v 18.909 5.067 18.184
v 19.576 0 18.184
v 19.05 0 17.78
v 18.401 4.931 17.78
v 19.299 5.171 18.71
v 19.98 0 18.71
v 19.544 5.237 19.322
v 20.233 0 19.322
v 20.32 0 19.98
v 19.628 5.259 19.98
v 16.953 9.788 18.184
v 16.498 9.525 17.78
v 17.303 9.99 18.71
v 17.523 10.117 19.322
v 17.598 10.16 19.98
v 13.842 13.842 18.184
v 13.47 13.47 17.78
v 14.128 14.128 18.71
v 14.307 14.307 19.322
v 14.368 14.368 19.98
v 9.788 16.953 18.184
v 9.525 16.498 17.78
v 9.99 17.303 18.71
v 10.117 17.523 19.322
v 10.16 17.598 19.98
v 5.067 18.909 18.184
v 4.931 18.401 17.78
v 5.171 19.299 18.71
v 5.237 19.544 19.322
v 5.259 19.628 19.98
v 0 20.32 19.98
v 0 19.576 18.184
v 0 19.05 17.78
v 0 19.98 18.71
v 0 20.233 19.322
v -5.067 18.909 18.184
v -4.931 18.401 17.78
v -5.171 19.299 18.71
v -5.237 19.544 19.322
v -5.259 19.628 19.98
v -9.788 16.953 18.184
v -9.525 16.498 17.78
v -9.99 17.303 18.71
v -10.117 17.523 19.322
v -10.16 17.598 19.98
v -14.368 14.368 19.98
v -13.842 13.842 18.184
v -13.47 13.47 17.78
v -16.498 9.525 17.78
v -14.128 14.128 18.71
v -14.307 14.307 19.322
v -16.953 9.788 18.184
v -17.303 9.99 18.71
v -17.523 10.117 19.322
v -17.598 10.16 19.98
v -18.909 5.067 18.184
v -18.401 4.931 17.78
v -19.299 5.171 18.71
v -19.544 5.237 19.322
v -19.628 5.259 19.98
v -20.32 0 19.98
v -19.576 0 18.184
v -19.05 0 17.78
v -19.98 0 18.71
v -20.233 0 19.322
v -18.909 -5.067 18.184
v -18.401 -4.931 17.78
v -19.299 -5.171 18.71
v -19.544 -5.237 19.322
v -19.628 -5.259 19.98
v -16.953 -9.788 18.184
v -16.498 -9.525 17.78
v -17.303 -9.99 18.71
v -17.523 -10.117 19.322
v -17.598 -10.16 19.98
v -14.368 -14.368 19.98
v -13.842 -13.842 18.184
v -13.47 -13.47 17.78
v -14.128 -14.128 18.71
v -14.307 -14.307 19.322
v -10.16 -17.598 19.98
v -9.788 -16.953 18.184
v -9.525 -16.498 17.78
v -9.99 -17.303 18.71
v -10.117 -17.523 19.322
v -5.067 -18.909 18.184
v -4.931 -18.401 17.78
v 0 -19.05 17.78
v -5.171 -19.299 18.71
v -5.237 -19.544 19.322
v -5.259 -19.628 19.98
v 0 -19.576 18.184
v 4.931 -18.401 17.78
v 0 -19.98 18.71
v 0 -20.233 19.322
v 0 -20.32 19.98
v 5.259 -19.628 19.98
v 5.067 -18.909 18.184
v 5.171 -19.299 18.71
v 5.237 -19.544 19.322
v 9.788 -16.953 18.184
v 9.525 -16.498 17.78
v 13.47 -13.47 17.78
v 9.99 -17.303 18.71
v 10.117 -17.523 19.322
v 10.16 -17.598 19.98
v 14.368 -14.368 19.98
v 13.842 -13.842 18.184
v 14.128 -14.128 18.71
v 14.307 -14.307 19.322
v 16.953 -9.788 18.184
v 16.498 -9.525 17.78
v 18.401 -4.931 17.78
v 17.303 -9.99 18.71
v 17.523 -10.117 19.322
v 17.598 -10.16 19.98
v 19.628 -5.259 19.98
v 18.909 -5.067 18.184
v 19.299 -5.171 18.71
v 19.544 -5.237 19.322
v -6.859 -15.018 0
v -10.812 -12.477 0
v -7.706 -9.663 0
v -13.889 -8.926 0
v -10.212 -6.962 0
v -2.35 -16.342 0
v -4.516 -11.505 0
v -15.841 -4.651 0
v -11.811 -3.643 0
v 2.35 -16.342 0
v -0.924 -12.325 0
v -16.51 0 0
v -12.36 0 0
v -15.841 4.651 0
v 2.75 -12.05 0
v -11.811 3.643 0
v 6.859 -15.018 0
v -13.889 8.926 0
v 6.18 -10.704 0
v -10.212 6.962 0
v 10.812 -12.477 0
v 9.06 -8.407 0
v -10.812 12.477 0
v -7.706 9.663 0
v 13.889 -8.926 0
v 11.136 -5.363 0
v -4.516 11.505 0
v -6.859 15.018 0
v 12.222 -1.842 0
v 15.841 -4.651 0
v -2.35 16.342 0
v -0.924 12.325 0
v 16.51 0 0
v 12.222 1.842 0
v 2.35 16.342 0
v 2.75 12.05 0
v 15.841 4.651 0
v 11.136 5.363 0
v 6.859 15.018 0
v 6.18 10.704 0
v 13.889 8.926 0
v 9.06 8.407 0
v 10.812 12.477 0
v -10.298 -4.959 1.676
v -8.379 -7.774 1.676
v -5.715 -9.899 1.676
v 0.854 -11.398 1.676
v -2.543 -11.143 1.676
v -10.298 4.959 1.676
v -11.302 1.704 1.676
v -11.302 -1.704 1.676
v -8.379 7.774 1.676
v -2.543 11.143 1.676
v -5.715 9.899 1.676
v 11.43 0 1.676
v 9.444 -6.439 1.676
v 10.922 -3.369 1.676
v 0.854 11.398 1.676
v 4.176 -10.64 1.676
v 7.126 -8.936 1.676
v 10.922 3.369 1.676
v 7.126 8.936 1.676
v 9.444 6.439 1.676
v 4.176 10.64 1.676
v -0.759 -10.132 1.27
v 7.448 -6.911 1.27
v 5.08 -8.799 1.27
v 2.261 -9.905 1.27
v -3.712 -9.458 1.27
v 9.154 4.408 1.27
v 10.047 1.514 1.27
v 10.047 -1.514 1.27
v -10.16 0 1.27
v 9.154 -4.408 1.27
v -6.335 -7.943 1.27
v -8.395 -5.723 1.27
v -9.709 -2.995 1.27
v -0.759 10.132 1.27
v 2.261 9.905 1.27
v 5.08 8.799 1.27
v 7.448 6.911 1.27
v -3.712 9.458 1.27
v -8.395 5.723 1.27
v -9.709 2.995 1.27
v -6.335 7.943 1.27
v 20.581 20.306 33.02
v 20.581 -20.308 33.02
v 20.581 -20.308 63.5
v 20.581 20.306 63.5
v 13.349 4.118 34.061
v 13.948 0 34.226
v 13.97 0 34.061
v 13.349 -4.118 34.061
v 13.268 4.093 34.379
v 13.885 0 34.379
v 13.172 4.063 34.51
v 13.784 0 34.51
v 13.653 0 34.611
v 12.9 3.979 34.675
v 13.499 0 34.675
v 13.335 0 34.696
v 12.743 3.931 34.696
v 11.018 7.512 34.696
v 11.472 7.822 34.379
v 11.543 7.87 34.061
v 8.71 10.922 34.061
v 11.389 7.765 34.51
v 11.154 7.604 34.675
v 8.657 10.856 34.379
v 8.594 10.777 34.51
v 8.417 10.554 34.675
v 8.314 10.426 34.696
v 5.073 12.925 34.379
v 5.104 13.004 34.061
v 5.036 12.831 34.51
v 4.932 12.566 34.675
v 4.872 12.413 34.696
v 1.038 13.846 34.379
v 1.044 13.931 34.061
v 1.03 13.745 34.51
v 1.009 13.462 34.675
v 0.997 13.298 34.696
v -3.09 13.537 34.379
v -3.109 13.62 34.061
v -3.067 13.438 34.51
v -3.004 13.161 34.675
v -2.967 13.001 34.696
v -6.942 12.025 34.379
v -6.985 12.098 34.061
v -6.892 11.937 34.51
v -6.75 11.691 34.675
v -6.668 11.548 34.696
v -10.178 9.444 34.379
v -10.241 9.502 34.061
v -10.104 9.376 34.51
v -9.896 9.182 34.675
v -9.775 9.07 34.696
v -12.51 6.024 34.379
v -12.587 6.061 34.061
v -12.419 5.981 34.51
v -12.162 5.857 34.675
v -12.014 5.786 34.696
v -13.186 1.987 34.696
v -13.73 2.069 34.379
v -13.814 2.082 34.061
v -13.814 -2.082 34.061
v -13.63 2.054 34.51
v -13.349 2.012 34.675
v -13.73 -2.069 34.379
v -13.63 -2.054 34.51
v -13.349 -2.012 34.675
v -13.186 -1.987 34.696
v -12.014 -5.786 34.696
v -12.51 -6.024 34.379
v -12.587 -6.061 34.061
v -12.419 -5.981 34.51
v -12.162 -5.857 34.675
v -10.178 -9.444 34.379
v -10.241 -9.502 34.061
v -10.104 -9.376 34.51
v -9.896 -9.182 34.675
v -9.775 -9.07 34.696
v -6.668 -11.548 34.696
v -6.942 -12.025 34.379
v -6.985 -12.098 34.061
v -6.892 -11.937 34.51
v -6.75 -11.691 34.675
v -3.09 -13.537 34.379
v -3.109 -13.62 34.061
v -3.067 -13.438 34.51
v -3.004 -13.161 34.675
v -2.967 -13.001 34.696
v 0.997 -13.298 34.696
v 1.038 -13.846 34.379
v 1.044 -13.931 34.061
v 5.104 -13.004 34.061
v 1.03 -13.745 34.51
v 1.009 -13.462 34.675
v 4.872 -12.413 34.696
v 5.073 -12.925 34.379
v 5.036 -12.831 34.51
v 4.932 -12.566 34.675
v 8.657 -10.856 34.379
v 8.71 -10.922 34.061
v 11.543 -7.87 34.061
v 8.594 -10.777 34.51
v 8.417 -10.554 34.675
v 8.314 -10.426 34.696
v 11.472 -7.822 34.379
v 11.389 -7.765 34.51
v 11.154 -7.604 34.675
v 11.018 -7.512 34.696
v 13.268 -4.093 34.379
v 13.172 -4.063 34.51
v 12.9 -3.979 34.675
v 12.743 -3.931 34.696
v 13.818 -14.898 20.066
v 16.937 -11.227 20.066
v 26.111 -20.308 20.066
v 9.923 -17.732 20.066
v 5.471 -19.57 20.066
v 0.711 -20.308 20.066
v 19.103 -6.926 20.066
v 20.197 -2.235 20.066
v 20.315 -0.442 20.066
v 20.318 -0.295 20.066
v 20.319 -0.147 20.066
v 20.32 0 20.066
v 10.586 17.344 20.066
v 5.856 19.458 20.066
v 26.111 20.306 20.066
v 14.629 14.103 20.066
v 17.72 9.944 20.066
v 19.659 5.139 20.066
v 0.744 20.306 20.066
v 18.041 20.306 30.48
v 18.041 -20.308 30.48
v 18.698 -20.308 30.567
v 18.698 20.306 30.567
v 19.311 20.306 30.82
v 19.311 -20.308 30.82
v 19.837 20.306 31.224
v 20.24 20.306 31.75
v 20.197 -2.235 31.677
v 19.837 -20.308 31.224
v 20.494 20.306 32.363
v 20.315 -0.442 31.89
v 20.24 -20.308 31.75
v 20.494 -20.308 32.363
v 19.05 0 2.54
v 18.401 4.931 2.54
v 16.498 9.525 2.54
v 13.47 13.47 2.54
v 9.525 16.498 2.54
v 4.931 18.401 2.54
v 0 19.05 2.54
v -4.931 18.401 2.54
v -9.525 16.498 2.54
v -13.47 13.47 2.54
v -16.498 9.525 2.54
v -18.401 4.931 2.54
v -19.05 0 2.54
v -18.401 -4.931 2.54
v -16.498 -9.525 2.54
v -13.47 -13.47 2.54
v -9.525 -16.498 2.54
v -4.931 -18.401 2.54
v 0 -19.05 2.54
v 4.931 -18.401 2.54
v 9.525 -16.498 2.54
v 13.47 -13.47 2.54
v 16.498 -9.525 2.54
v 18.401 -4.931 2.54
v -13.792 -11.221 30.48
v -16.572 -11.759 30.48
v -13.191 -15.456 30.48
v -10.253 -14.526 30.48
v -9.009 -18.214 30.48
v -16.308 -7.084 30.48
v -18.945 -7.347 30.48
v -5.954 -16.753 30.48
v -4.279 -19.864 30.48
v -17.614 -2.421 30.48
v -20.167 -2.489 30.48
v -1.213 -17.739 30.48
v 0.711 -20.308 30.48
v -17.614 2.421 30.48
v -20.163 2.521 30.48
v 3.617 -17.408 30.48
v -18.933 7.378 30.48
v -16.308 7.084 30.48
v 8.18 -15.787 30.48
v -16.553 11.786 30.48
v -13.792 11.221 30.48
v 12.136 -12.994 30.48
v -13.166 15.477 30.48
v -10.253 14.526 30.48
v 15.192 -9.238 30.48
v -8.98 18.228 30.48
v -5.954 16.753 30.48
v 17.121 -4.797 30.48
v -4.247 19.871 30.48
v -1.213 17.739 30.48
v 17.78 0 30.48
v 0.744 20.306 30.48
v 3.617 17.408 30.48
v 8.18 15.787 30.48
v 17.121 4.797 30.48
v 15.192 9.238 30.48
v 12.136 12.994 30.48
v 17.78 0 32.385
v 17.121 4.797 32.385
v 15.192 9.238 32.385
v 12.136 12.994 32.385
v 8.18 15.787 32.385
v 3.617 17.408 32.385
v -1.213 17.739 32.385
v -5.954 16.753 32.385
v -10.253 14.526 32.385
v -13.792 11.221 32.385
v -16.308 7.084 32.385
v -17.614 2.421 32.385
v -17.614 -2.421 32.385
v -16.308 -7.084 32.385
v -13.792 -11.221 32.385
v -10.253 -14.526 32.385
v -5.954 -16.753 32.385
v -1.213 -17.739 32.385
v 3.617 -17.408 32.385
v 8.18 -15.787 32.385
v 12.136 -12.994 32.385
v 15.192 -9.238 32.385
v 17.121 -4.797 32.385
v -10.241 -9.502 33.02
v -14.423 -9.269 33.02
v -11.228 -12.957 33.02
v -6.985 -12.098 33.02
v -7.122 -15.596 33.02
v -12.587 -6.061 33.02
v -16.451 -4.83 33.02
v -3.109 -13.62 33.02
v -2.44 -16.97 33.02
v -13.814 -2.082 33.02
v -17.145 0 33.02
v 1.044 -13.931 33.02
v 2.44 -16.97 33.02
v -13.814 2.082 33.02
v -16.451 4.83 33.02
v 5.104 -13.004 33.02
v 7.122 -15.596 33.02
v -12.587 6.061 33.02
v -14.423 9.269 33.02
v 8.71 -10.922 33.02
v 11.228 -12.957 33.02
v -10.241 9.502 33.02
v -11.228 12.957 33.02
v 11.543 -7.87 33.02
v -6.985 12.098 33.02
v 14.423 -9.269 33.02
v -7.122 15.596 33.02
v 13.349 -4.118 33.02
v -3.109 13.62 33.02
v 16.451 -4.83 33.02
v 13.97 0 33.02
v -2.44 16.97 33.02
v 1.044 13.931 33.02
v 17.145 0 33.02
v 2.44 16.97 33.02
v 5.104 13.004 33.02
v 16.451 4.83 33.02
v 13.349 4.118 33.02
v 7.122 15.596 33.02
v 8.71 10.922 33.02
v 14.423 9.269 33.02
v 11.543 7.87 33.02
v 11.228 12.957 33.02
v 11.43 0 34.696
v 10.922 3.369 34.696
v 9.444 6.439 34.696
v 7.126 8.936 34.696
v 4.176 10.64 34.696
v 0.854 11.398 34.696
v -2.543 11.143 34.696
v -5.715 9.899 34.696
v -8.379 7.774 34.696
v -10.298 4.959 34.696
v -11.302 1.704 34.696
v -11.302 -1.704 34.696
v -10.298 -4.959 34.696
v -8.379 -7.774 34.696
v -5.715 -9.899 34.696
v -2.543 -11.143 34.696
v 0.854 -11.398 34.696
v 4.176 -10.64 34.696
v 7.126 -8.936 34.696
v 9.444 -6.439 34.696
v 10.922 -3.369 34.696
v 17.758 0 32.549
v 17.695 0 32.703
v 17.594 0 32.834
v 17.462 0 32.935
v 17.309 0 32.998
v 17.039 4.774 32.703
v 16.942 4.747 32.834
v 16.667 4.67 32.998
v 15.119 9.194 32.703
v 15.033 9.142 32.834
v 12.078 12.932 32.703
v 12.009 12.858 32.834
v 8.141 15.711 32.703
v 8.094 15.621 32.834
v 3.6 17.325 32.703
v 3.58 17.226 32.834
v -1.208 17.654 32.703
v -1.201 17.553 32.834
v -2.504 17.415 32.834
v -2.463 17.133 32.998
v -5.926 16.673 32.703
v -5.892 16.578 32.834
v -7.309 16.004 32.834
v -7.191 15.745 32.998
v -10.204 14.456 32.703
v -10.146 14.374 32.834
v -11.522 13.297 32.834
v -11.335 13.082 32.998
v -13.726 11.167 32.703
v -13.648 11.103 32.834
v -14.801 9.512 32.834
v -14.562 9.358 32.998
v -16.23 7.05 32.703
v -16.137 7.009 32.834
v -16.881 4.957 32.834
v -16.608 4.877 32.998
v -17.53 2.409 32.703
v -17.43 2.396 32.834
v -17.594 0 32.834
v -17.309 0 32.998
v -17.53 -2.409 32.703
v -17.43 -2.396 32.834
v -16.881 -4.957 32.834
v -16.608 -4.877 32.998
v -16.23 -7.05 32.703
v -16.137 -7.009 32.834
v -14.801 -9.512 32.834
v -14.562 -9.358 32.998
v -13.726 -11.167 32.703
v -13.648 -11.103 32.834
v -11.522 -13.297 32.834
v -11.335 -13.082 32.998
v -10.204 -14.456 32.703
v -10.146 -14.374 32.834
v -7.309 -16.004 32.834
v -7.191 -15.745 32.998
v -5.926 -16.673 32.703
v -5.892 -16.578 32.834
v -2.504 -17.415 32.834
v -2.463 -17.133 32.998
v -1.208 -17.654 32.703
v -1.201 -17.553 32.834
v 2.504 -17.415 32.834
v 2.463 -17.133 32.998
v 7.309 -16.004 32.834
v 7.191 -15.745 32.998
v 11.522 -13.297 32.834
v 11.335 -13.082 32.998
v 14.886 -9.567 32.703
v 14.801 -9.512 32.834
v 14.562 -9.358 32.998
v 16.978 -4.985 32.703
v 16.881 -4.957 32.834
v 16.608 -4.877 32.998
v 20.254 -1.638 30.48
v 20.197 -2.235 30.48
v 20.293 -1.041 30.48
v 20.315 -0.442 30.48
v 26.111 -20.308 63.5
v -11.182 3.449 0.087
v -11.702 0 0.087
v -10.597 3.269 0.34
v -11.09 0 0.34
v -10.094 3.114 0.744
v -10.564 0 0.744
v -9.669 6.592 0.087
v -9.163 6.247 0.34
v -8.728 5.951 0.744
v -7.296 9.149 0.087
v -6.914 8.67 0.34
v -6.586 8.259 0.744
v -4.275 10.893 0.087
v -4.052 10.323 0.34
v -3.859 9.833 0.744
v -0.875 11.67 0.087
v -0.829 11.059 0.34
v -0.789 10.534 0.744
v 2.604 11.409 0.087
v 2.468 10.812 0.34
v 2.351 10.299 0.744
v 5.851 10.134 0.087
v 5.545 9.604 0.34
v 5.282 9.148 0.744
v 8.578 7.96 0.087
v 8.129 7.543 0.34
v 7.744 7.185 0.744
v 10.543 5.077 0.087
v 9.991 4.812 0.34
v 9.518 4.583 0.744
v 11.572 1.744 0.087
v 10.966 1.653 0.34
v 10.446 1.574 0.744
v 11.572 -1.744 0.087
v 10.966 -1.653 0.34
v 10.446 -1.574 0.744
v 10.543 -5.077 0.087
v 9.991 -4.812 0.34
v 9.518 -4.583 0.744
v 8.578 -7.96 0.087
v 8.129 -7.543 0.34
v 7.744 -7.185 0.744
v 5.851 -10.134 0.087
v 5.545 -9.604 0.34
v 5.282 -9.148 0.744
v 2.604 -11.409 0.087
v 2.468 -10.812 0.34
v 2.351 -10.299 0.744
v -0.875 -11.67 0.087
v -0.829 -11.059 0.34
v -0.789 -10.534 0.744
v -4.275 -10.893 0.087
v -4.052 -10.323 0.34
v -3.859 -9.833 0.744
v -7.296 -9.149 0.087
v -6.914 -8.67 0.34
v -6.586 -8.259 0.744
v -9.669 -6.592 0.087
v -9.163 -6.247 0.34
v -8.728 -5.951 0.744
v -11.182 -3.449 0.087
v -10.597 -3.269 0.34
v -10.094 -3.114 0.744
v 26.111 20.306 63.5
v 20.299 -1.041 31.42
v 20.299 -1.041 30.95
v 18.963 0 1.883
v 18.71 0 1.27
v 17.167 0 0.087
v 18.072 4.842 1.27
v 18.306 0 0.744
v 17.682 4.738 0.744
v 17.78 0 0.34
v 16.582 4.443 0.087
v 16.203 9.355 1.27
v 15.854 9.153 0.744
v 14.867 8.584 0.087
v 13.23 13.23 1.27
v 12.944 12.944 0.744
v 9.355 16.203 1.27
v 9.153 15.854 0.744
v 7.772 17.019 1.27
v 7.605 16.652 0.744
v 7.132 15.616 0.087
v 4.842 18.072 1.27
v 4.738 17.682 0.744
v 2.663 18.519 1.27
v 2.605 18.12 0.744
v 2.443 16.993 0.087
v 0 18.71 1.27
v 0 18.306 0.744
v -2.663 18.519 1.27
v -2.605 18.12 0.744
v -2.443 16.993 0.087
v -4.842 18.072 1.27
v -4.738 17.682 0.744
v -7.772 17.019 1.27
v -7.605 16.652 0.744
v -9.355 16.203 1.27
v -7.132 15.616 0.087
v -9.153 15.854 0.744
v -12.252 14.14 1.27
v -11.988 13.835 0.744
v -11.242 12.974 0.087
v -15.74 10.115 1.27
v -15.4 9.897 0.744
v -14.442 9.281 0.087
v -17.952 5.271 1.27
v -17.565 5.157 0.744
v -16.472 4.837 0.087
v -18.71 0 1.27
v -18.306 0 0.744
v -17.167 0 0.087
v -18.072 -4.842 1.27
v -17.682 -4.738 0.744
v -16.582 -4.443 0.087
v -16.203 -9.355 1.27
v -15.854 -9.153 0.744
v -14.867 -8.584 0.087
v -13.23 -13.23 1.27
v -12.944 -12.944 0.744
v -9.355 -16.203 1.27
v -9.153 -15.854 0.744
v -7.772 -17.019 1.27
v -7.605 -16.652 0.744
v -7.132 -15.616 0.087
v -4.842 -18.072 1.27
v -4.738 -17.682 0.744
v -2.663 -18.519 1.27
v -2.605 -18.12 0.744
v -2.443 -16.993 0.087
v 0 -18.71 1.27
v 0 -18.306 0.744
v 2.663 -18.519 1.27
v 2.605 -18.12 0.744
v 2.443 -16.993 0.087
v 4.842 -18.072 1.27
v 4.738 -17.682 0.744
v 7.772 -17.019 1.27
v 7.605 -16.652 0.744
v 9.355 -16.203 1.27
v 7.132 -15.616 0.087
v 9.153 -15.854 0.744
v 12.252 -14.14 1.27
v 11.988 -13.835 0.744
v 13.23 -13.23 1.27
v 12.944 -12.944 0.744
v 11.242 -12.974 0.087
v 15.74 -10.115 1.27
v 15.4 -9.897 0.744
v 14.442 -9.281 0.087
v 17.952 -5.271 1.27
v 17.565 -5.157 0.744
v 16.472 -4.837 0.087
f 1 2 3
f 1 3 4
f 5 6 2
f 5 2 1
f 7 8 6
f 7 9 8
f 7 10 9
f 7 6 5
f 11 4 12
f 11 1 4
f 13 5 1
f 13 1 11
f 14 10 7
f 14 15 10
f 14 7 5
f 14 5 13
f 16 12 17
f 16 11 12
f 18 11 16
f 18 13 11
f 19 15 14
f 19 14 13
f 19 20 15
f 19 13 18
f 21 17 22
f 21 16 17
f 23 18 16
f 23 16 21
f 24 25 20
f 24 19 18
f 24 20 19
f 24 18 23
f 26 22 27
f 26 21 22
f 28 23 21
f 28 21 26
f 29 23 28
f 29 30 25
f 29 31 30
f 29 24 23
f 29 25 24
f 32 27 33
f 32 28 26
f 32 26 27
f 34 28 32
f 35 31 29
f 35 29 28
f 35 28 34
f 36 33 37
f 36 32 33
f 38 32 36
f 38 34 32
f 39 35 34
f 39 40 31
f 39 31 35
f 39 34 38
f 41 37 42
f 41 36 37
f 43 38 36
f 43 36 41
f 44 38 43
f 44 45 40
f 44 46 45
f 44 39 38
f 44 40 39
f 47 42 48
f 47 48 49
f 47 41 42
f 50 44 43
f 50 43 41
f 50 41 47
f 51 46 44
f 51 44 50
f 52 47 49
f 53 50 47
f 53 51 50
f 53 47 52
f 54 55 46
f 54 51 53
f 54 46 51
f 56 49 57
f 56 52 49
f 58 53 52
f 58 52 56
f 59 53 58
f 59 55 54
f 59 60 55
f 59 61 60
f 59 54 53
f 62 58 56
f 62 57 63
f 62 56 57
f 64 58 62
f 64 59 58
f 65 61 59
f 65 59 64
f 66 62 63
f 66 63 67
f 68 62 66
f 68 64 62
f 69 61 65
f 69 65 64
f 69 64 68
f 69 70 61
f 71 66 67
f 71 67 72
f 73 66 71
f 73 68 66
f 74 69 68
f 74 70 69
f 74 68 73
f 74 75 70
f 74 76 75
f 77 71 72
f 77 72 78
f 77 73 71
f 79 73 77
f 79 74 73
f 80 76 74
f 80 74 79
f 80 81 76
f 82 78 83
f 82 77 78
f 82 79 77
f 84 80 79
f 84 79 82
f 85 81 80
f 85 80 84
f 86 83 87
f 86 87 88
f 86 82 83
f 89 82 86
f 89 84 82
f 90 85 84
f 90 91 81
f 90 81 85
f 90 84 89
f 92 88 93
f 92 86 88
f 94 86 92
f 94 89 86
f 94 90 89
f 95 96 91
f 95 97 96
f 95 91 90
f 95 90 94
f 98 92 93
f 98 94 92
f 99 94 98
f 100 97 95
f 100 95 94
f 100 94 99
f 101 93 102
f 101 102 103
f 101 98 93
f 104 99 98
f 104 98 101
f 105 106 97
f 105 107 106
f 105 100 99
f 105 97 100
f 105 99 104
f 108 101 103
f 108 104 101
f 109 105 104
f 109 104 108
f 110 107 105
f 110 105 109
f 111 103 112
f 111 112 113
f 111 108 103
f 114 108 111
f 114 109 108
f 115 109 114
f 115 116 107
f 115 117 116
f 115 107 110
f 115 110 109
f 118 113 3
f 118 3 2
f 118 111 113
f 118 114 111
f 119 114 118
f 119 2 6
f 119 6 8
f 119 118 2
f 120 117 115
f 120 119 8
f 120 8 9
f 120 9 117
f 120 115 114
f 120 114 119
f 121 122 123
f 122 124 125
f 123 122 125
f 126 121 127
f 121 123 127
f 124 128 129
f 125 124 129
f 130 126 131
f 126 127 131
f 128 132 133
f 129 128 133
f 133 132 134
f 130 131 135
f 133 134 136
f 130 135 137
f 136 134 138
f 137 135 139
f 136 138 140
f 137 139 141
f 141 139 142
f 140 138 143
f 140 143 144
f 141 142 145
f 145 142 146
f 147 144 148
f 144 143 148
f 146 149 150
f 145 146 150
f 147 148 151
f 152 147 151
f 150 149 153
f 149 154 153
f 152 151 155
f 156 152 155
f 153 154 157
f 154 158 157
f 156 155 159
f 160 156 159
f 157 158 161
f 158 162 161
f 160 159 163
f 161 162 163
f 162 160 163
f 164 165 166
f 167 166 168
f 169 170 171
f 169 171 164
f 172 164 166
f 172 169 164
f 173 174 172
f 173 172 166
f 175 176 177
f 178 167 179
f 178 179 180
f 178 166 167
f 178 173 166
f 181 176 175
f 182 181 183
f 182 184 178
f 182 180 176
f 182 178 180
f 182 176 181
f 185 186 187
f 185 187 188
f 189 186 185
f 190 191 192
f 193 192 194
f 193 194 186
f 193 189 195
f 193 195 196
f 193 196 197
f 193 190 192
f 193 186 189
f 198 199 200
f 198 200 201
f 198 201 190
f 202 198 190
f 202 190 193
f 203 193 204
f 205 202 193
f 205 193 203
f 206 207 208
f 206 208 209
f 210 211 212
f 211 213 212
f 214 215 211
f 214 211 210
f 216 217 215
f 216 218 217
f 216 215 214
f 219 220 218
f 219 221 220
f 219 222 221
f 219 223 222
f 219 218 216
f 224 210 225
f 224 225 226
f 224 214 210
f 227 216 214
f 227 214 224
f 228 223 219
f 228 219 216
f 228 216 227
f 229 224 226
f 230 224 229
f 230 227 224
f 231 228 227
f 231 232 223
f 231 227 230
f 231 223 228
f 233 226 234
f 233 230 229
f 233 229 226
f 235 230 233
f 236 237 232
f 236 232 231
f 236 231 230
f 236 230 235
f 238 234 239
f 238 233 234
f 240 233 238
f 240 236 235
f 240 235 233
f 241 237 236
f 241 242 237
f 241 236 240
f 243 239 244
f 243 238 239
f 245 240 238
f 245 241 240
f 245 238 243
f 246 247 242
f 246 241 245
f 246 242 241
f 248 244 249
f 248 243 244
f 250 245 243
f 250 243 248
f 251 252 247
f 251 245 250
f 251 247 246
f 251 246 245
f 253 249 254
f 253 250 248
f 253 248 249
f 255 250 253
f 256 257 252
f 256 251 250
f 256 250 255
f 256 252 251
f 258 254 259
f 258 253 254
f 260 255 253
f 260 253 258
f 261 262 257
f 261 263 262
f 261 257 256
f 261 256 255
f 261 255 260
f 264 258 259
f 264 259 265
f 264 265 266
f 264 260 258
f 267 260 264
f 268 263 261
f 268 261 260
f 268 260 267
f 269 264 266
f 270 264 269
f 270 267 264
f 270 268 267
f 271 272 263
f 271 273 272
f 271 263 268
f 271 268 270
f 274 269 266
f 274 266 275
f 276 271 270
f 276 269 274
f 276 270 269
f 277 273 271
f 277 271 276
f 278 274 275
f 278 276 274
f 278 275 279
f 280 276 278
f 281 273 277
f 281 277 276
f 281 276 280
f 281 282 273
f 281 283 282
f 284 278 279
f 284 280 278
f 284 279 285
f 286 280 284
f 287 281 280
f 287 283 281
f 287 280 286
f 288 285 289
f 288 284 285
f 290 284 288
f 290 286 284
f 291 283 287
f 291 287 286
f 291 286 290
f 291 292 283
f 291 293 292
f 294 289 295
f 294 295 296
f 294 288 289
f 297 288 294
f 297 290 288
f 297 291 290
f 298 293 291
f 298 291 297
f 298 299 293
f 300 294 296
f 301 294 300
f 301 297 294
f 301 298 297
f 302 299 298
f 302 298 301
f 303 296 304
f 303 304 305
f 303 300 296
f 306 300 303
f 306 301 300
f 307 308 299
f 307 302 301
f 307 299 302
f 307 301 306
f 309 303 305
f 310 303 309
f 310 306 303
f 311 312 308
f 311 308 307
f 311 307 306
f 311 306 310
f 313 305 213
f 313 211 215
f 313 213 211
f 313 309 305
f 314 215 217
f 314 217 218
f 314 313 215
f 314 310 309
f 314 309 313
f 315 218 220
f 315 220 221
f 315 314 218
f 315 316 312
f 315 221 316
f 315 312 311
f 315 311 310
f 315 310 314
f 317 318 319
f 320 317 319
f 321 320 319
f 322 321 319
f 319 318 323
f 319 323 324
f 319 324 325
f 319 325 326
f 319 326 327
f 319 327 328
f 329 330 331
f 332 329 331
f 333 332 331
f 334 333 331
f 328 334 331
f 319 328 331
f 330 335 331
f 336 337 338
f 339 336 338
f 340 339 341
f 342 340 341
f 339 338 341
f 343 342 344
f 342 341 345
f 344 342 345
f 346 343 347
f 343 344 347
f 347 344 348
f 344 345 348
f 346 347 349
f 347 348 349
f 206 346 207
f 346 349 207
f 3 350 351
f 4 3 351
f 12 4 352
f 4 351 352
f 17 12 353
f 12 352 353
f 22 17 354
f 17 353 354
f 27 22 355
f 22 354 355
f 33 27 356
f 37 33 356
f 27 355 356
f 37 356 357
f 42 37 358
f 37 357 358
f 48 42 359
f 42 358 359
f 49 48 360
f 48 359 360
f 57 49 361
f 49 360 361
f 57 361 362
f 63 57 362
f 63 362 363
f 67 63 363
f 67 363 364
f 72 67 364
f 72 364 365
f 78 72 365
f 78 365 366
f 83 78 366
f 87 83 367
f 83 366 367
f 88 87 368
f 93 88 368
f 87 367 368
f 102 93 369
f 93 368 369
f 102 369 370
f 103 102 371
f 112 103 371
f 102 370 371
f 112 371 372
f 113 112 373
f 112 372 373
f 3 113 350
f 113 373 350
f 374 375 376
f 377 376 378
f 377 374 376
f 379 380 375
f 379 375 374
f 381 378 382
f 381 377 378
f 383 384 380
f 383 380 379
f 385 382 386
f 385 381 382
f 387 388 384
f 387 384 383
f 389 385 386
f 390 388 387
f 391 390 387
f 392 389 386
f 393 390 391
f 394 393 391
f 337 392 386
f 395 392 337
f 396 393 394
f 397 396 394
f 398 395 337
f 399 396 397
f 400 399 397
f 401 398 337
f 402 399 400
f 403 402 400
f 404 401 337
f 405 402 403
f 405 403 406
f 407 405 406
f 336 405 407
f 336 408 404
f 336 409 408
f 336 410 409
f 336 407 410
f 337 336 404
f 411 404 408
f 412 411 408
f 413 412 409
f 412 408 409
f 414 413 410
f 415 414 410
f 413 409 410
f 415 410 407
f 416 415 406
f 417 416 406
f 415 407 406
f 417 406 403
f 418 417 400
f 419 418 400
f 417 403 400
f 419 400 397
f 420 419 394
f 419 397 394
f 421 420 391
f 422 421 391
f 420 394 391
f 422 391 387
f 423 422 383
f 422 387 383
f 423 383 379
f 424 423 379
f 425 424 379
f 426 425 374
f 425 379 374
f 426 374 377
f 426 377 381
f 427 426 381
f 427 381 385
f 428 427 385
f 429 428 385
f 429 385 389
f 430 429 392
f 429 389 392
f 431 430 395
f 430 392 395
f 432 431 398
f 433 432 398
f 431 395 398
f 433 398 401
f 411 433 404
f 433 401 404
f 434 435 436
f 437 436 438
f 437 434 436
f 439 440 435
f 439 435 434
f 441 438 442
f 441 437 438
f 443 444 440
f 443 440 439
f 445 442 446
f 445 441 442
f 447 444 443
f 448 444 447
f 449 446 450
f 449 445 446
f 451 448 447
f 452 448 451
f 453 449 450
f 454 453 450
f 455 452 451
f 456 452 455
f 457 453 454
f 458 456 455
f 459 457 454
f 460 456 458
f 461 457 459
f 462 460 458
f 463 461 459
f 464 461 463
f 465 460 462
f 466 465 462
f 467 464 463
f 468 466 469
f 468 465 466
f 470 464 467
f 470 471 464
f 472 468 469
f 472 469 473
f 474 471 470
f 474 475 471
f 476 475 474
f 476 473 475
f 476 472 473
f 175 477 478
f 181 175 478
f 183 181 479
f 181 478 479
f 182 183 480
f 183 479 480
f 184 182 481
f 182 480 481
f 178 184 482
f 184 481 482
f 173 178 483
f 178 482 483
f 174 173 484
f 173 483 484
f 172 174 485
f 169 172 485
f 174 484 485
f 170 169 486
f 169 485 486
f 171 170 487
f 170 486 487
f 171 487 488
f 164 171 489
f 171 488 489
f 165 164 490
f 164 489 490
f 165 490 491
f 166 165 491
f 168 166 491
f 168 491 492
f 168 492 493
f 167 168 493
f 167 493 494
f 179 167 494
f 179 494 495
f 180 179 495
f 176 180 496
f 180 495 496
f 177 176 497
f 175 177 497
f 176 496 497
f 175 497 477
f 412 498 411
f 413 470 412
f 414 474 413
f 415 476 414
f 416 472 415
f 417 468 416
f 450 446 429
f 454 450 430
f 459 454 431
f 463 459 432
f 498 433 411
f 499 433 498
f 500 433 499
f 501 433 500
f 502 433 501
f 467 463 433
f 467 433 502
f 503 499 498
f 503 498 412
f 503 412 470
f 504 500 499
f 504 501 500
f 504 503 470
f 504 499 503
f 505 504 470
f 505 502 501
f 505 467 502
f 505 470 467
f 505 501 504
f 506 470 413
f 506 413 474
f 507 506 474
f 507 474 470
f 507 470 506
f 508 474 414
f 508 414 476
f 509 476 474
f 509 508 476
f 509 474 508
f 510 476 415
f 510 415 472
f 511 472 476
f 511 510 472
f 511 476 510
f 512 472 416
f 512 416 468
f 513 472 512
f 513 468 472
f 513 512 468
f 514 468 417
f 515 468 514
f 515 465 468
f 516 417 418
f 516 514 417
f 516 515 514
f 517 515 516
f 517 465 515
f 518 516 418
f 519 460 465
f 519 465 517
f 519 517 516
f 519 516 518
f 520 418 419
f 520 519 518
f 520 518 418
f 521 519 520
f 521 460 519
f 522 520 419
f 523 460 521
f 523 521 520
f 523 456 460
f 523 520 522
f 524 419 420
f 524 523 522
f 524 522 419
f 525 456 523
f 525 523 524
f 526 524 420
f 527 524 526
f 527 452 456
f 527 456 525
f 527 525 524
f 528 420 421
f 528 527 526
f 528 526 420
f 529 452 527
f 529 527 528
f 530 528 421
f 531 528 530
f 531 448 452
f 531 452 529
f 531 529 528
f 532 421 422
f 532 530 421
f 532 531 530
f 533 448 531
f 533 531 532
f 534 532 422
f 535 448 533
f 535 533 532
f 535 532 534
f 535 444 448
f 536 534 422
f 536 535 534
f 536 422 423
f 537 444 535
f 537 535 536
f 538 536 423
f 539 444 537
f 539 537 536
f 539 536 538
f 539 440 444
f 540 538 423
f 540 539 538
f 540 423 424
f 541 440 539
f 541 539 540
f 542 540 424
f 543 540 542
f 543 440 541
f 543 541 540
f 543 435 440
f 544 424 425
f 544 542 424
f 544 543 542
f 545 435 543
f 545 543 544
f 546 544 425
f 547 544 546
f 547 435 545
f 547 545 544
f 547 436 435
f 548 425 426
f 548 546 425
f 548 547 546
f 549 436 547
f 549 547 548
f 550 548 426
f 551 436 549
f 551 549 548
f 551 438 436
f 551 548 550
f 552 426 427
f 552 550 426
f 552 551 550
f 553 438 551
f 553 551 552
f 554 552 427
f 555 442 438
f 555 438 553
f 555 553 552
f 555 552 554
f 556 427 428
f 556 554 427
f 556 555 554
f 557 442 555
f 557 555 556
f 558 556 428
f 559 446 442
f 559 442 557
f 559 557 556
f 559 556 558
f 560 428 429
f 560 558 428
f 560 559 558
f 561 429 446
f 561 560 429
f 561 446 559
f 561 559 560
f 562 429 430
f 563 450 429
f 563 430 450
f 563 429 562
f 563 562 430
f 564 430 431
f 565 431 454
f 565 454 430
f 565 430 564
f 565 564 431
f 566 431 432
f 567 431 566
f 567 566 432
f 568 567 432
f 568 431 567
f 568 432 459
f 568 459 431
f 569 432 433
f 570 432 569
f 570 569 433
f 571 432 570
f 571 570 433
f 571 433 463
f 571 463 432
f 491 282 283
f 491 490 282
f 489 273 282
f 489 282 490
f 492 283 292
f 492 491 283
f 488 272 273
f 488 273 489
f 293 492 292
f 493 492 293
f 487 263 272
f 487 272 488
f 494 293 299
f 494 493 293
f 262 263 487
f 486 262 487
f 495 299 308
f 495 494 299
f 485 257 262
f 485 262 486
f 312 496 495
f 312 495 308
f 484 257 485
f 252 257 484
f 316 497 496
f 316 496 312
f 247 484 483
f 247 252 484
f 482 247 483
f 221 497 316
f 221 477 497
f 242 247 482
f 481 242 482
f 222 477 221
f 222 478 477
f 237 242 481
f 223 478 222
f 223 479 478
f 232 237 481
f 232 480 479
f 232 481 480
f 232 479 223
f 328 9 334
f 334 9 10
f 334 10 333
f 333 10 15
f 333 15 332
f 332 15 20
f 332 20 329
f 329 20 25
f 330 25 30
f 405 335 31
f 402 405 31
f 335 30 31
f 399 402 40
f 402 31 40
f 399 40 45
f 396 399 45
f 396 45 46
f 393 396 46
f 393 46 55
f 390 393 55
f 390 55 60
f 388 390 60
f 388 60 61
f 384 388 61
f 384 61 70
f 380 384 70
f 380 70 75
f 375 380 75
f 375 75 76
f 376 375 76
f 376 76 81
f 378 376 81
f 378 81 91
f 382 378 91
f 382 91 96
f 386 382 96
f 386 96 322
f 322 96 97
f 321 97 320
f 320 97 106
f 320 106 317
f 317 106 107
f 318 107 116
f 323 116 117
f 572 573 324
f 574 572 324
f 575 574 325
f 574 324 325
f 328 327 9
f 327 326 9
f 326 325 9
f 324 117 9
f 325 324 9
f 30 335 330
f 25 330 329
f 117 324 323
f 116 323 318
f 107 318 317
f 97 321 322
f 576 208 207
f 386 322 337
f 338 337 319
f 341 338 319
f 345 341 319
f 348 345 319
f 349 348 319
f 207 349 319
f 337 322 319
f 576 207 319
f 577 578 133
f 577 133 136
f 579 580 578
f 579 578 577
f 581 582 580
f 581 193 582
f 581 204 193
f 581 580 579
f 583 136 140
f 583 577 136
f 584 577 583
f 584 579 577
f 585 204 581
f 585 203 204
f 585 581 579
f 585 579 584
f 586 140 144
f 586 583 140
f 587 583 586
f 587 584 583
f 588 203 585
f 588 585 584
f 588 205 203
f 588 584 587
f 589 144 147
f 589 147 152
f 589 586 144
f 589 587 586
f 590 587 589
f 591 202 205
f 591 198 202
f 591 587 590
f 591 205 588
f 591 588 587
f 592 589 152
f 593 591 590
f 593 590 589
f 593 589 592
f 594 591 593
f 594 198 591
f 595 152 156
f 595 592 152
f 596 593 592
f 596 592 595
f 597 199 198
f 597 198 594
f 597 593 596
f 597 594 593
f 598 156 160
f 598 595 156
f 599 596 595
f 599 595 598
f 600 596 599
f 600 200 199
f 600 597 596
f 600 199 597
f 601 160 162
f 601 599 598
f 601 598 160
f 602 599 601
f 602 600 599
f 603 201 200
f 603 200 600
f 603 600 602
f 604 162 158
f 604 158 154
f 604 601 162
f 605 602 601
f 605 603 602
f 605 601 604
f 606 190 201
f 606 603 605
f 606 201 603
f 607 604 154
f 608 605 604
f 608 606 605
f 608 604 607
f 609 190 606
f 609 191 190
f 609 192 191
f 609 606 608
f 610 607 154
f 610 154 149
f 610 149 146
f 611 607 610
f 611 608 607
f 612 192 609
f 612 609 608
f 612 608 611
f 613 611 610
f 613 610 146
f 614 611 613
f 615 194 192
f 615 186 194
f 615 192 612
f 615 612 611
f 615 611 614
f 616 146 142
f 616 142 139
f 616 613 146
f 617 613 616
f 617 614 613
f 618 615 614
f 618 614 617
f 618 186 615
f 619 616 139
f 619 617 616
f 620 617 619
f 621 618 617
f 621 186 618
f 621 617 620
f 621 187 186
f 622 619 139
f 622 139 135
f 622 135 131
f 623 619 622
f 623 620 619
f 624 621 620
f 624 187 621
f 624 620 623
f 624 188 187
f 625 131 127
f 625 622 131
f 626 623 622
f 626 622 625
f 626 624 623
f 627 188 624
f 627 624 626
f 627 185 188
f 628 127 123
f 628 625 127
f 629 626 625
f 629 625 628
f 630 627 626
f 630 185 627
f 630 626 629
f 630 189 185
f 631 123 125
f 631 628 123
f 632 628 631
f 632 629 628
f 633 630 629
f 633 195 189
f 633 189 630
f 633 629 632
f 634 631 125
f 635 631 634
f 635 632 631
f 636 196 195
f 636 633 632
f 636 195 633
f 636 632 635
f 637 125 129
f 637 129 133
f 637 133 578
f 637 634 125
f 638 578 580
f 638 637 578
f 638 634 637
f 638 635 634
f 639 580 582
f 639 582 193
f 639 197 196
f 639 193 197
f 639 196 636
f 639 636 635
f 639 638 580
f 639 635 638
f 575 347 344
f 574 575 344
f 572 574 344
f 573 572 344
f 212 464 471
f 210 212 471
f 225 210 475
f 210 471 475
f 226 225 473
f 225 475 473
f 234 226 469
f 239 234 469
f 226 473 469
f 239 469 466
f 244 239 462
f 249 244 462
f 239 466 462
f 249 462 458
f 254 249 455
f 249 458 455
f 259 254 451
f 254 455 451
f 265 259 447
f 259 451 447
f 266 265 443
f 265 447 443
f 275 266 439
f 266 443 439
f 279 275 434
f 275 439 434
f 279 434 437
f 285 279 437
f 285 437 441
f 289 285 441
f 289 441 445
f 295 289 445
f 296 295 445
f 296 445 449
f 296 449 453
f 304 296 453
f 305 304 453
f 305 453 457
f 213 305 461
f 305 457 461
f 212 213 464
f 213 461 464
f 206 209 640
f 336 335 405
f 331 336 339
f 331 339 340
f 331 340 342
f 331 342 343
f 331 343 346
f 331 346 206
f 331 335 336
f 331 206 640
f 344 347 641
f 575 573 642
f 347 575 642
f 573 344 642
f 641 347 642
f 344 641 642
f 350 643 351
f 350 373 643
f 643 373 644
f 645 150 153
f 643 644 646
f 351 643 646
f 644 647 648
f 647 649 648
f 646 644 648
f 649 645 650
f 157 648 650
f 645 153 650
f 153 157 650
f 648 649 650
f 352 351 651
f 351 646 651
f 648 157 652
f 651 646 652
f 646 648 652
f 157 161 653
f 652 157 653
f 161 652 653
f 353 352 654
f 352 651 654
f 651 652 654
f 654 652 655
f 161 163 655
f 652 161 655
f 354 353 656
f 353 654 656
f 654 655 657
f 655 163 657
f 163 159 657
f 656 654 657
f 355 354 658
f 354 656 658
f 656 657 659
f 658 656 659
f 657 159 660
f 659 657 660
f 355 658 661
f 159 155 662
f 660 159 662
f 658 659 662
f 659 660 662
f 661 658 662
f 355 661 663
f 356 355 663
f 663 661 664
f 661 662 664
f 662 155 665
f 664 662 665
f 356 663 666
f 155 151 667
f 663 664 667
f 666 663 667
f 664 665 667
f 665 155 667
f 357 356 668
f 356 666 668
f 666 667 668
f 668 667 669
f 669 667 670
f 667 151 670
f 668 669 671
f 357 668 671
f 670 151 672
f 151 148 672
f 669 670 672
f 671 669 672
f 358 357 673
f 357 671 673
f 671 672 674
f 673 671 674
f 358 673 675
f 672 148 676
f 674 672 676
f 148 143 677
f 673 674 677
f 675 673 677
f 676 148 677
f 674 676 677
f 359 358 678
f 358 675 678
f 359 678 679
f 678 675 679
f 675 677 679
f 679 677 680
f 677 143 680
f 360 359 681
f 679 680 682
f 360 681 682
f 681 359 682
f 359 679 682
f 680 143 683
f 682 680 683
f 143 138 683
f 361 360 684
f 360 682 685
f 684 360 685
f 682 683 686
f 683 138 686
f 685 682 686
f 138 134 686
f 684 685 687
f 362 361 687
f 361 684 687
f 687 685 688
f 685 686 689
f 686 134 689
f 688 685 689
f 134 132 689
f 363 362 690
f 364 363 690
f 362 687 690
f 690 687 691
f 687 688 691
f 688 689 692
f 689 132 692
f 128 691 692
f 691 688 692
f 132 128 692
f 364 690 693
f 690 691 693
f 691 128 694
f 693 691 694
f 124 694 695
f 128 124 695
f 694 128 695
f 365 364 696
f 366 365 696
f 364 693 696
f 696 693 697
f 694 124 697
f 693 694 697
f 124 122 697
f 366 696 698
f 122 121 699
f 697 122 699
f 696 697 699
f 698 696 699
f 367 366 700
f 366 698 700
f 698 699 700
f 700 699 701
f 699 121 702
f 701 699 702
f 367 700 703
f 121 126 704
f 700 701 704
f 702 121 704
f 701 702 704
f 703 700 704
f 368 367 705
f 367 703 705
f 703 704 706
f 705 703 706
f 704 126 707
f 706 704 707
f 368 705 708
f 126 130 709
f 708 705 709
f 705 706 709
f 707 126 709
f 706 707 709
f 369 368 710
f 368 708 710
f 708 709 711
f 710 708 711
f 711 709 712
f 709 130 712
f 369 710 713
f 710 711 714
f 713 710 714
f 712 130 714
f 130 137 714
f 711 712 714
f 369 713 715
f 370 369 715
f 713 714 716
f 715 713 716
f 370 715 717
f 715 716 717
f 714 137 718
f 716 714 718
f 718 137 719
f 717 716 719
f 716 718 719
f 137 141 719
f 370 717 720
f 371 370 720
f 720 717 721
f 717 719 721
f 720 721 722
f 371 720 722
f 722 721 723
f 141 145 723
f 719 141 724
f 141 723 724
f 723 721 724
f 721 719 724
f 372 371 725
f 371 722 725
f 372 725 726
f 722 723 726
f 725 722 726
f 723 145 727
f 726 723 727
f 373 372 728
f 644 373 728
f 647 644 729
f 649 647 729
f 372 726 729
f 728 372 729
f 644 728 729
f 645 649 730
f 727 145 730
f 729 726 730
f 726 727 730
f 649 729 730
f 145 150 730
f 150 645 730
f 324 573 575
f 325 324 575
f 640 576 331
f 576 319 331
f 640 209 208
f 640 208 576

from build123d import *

# Parameters (mm, degrees)
SKETCH1_R           = 19.05
BOSS_EXTRUDE1_DEPTH = 17.78
SKETCH2_R           = 10.16
CUT_EXTRUDE1_DEPTH  = 1.27
FILLET1_R           = 2.54
FILLET2_R           = 2.54
SKETCH3_R           = 20.32
BOSS_EXTRUDE2_DEPTH = 12.7
FILLET3_R           = 2.54
SKETCH4_R           = 17.78
BOSS_EXTRUDE3_DEPTH = 2.54
SKETCH5_R           = 13.97
BOSS_EXTRUDE4_DEPTH = 1.6764
FILLET5_R           = 0.635
SKETCH6_R           = 11.43
CUT_EXTRUDE2_DEPTH  = 33.02
BOSS_EXTRUDE6_DEPTH = 10.414
SKETCH9_W           = 5.530491266
SKETCH9_H           = 40.61393848
BOSS_EXTRUDE7_DEPTH = 33.02
FILLET6_START       = -20.30755603
FILLET6_DEPTH       = 40.61393848
FILLET6_START_2     = 30.48
FILLET6_2_DEPTH     = 2.52


with BuildPart() as part:
    # Sketch1 → Boss-Extrude1 (new body)
    with BuildSketch(Plane.XY):
        Circle(SKETCH1_R)
    extrude(amount=BOSS_EXTRUDE1_DEPTH)

    # Sketch2 → Cut-Extrude1 (cut)
    with BuildSketch(Plane(origin=(0, 0, 0), x_dir=(-1, 0, 0), z_dir=(0, 0, -1))):
        Circle(SKETCH2_R)
    extrude(amount=-CUT_EXTRUDE1_DEPTH, mode=Mode.SUBTRACT)

    # Fillet1
    # the kernel refuses this fillet: 2.54 mm, written as the material it takes off along each edge
    with BuildSketch(Plane(origin=(0, 0, 0), x_dir=(-1, 0, 0), z_dir=(0, -1, 0))) as fillet1_piece_1:
        with BuildLine():
            CenterArc((12.359704526, -2.54), FILLET1_R, 90, 60)
            Line((10.16, -1.27), (10.116005909, -1.2446))
            ThreePointArc((10.116005909, -1.2446), (10.1092, -0.635), (10.1092, 0))
            Line((10.1092, 0), (10.16, 0.0508))
            Line((10.16, 0.0508), (12.359704526, 0.0508))
            Line((12.359704526, 0.0508), (12.359704526, 0))
        make_face()
    revolve(axis=Axis((0, 0, 0), (0, 0, -1)), mode=Mode.SUBTRACT)

    # Fillet2
    fillet2_edges = [part.edges().sort_by_distance(p)[0] for p in [
        (-19.05, 0, 0),
    ]]
    fillet(fillet2_edges, radius=FILLET2_R)

    # Sketch3 → Boss-Extrude2 (add)
    with BuildSketch(Plane.XY.offset(17.78)):
        Circle(SKETCH3_R)
    extrude(amount=BOSS_EXTRUDE2_DEPTH)

    # Fillet3
    # the kernel refuses this fillet: 2.54 mm, written as the material it takes off along each edge
    with BuildSketch(Plane(origin=(0, 0, 17.78), x_dir=(1, 0, 0), z_dir=(0, -1, 0))) as fillet3_piece_1:
        with BuildLine():
            CenterArc((17.78, 2.199704526), FILLET3_R, 300, 60)
            Line((19.05, 0), (19.0754, -0.043994091))
            ThreePointArc((19.0754, -0.043994091), (19.685, -0.0508), (20.32, -0.0508))
            Line((20.32, -0.0508), (20.3708, 0))
            Line((20.3708, 0), (20.3708, 2.199704526))
            Line((20.3708, 2.199704526), (20.32, 2.199704526))
        make_face()
    revolve(axis=Axis((0, 0, 17.78), (0, 0, 1)), mode=Mode.SUBTRACT)

    # Sketch4 → Boss-Extrude3 (add)
    with BuildSketch(Plane.XY.offset(30.48)):
        Circle(SKETCH4_R)
    extrude(amount=BOSS_EXTRUDE3_DEPTH)

    # Sketch5 → Boss-Extrude4 (add)
    with BuildSketch(Plane.XY.offset(33.02)):
        Circle(SKETCH5_R)
    extrude(amount=BOSS_EXTRUDE4_DEPTH)

    # Fillet5
    fillet5_edges = [part.edges().sort_by_distance(p)[0] for p in [
        (-17.78, 0, 33.02),
        (-13.97, 0, 34.6964),
    ]]
    fillet(fillet5_edges, radius=FILLET5_R)

    # Sketch6 → Cut-Extrude2 (cut)
    with BuildSketch(Plane.XY.offset(34.6964)):
        Circle(SKETCH6_R)
    extrude(amount=-CUT_EXTRUDE2_DEPTH, mode=Mode.SUBTRACT)

    # Sketch7 → Boss-Extrude6 (add)
    with BuildSketch(Plane.XY.offset(30.48)):
        with BuildLine():
            Line((0.71103311, -20.30755603), (26.11103311, -20.30755603))
            Line((26.11103311, -20.30755603), (26.11103311, 20.30638245))
            Line((26.11103311, 20.30638245), (0.743795542, 20.30638245))
            Line((0.743795542, 20.30638245), (0.743795542, 19.03638245))
            add(Edge.make_bspline(
                [(0.71103311, -19.03755603), (10.719056995, -19.88065927), (29.921844126, -0.322882605), (10.700257888, 19.398993092), (0.743795542, 19.03638245)],
                knots=[0, 0, 0, 0, 0.495916673, 1, 1, 1, 1], degree=3))
            Line((0.71103311, -19.03755603), (0.71103311, -20.30755603))
        make_face()
    extrude(amount=-BOSS_EXTRUDE6_DEPTH)

    # Sketch9 → Boss-Extrude7 (add)
    with BuildSketch(Plane.XY.offset(30.48)):
        with Locations((23.345787477, -0.00058679)):
            Rectangle(SKETCH9_W, SKETCH9_H)
    extrude(amount=BOSS_EXTRUDE7_DEPTH)

    # Fillet6: read off the stored shape, not the designer's step
    # Fillet6 outline → Fillet6 (add)
    with BuildSketch(Plane(origin=(0, 0, 0), x_dir=(1, 0, 0), z_dir=(0, 1, 0)).offset(FILLET6_START)):
        with BuildLine():
            Line((20.580541844, -30.48), (18.040541844, -30.48))
            ThreePointArc((18.040541844, -30.48), (19.836593068, -31.223948776), (20.580541844, -33.02))
            Line((20.580541844, -33.02), (20.580541844, -30.48))
        make_face()
    extrude(amount=FILLET6_DEPTH)

    # Fillet6 2 outline → Fillet6 2 (cut)
    with BuildSketch(Plane.XY.offset(FILLET6_START_2)):
        with BuildLine():
            add(Edge.make_bspline(
                [(20.315186876, -0.442246776), (20.310692243, -1.040693916), (20.270518605, -1.638988681), (20.196745769, -2.234694689)],
                knots=[0.504083327, 0.504083327, 0.504083327, 0.504083327, 0.534555468, 0.534555468, 0.534555468, 0.534555468], degree=3))
            ThreePointArc((20.315186876, -0.442246776), (20.275783315, -1.339780197), (20.196745769, -2.234694689))
        make_face()
    extrude(amount=FILLET6_2_DEPTH, mode=Mode.SUBTRACT)


solid = part.part
